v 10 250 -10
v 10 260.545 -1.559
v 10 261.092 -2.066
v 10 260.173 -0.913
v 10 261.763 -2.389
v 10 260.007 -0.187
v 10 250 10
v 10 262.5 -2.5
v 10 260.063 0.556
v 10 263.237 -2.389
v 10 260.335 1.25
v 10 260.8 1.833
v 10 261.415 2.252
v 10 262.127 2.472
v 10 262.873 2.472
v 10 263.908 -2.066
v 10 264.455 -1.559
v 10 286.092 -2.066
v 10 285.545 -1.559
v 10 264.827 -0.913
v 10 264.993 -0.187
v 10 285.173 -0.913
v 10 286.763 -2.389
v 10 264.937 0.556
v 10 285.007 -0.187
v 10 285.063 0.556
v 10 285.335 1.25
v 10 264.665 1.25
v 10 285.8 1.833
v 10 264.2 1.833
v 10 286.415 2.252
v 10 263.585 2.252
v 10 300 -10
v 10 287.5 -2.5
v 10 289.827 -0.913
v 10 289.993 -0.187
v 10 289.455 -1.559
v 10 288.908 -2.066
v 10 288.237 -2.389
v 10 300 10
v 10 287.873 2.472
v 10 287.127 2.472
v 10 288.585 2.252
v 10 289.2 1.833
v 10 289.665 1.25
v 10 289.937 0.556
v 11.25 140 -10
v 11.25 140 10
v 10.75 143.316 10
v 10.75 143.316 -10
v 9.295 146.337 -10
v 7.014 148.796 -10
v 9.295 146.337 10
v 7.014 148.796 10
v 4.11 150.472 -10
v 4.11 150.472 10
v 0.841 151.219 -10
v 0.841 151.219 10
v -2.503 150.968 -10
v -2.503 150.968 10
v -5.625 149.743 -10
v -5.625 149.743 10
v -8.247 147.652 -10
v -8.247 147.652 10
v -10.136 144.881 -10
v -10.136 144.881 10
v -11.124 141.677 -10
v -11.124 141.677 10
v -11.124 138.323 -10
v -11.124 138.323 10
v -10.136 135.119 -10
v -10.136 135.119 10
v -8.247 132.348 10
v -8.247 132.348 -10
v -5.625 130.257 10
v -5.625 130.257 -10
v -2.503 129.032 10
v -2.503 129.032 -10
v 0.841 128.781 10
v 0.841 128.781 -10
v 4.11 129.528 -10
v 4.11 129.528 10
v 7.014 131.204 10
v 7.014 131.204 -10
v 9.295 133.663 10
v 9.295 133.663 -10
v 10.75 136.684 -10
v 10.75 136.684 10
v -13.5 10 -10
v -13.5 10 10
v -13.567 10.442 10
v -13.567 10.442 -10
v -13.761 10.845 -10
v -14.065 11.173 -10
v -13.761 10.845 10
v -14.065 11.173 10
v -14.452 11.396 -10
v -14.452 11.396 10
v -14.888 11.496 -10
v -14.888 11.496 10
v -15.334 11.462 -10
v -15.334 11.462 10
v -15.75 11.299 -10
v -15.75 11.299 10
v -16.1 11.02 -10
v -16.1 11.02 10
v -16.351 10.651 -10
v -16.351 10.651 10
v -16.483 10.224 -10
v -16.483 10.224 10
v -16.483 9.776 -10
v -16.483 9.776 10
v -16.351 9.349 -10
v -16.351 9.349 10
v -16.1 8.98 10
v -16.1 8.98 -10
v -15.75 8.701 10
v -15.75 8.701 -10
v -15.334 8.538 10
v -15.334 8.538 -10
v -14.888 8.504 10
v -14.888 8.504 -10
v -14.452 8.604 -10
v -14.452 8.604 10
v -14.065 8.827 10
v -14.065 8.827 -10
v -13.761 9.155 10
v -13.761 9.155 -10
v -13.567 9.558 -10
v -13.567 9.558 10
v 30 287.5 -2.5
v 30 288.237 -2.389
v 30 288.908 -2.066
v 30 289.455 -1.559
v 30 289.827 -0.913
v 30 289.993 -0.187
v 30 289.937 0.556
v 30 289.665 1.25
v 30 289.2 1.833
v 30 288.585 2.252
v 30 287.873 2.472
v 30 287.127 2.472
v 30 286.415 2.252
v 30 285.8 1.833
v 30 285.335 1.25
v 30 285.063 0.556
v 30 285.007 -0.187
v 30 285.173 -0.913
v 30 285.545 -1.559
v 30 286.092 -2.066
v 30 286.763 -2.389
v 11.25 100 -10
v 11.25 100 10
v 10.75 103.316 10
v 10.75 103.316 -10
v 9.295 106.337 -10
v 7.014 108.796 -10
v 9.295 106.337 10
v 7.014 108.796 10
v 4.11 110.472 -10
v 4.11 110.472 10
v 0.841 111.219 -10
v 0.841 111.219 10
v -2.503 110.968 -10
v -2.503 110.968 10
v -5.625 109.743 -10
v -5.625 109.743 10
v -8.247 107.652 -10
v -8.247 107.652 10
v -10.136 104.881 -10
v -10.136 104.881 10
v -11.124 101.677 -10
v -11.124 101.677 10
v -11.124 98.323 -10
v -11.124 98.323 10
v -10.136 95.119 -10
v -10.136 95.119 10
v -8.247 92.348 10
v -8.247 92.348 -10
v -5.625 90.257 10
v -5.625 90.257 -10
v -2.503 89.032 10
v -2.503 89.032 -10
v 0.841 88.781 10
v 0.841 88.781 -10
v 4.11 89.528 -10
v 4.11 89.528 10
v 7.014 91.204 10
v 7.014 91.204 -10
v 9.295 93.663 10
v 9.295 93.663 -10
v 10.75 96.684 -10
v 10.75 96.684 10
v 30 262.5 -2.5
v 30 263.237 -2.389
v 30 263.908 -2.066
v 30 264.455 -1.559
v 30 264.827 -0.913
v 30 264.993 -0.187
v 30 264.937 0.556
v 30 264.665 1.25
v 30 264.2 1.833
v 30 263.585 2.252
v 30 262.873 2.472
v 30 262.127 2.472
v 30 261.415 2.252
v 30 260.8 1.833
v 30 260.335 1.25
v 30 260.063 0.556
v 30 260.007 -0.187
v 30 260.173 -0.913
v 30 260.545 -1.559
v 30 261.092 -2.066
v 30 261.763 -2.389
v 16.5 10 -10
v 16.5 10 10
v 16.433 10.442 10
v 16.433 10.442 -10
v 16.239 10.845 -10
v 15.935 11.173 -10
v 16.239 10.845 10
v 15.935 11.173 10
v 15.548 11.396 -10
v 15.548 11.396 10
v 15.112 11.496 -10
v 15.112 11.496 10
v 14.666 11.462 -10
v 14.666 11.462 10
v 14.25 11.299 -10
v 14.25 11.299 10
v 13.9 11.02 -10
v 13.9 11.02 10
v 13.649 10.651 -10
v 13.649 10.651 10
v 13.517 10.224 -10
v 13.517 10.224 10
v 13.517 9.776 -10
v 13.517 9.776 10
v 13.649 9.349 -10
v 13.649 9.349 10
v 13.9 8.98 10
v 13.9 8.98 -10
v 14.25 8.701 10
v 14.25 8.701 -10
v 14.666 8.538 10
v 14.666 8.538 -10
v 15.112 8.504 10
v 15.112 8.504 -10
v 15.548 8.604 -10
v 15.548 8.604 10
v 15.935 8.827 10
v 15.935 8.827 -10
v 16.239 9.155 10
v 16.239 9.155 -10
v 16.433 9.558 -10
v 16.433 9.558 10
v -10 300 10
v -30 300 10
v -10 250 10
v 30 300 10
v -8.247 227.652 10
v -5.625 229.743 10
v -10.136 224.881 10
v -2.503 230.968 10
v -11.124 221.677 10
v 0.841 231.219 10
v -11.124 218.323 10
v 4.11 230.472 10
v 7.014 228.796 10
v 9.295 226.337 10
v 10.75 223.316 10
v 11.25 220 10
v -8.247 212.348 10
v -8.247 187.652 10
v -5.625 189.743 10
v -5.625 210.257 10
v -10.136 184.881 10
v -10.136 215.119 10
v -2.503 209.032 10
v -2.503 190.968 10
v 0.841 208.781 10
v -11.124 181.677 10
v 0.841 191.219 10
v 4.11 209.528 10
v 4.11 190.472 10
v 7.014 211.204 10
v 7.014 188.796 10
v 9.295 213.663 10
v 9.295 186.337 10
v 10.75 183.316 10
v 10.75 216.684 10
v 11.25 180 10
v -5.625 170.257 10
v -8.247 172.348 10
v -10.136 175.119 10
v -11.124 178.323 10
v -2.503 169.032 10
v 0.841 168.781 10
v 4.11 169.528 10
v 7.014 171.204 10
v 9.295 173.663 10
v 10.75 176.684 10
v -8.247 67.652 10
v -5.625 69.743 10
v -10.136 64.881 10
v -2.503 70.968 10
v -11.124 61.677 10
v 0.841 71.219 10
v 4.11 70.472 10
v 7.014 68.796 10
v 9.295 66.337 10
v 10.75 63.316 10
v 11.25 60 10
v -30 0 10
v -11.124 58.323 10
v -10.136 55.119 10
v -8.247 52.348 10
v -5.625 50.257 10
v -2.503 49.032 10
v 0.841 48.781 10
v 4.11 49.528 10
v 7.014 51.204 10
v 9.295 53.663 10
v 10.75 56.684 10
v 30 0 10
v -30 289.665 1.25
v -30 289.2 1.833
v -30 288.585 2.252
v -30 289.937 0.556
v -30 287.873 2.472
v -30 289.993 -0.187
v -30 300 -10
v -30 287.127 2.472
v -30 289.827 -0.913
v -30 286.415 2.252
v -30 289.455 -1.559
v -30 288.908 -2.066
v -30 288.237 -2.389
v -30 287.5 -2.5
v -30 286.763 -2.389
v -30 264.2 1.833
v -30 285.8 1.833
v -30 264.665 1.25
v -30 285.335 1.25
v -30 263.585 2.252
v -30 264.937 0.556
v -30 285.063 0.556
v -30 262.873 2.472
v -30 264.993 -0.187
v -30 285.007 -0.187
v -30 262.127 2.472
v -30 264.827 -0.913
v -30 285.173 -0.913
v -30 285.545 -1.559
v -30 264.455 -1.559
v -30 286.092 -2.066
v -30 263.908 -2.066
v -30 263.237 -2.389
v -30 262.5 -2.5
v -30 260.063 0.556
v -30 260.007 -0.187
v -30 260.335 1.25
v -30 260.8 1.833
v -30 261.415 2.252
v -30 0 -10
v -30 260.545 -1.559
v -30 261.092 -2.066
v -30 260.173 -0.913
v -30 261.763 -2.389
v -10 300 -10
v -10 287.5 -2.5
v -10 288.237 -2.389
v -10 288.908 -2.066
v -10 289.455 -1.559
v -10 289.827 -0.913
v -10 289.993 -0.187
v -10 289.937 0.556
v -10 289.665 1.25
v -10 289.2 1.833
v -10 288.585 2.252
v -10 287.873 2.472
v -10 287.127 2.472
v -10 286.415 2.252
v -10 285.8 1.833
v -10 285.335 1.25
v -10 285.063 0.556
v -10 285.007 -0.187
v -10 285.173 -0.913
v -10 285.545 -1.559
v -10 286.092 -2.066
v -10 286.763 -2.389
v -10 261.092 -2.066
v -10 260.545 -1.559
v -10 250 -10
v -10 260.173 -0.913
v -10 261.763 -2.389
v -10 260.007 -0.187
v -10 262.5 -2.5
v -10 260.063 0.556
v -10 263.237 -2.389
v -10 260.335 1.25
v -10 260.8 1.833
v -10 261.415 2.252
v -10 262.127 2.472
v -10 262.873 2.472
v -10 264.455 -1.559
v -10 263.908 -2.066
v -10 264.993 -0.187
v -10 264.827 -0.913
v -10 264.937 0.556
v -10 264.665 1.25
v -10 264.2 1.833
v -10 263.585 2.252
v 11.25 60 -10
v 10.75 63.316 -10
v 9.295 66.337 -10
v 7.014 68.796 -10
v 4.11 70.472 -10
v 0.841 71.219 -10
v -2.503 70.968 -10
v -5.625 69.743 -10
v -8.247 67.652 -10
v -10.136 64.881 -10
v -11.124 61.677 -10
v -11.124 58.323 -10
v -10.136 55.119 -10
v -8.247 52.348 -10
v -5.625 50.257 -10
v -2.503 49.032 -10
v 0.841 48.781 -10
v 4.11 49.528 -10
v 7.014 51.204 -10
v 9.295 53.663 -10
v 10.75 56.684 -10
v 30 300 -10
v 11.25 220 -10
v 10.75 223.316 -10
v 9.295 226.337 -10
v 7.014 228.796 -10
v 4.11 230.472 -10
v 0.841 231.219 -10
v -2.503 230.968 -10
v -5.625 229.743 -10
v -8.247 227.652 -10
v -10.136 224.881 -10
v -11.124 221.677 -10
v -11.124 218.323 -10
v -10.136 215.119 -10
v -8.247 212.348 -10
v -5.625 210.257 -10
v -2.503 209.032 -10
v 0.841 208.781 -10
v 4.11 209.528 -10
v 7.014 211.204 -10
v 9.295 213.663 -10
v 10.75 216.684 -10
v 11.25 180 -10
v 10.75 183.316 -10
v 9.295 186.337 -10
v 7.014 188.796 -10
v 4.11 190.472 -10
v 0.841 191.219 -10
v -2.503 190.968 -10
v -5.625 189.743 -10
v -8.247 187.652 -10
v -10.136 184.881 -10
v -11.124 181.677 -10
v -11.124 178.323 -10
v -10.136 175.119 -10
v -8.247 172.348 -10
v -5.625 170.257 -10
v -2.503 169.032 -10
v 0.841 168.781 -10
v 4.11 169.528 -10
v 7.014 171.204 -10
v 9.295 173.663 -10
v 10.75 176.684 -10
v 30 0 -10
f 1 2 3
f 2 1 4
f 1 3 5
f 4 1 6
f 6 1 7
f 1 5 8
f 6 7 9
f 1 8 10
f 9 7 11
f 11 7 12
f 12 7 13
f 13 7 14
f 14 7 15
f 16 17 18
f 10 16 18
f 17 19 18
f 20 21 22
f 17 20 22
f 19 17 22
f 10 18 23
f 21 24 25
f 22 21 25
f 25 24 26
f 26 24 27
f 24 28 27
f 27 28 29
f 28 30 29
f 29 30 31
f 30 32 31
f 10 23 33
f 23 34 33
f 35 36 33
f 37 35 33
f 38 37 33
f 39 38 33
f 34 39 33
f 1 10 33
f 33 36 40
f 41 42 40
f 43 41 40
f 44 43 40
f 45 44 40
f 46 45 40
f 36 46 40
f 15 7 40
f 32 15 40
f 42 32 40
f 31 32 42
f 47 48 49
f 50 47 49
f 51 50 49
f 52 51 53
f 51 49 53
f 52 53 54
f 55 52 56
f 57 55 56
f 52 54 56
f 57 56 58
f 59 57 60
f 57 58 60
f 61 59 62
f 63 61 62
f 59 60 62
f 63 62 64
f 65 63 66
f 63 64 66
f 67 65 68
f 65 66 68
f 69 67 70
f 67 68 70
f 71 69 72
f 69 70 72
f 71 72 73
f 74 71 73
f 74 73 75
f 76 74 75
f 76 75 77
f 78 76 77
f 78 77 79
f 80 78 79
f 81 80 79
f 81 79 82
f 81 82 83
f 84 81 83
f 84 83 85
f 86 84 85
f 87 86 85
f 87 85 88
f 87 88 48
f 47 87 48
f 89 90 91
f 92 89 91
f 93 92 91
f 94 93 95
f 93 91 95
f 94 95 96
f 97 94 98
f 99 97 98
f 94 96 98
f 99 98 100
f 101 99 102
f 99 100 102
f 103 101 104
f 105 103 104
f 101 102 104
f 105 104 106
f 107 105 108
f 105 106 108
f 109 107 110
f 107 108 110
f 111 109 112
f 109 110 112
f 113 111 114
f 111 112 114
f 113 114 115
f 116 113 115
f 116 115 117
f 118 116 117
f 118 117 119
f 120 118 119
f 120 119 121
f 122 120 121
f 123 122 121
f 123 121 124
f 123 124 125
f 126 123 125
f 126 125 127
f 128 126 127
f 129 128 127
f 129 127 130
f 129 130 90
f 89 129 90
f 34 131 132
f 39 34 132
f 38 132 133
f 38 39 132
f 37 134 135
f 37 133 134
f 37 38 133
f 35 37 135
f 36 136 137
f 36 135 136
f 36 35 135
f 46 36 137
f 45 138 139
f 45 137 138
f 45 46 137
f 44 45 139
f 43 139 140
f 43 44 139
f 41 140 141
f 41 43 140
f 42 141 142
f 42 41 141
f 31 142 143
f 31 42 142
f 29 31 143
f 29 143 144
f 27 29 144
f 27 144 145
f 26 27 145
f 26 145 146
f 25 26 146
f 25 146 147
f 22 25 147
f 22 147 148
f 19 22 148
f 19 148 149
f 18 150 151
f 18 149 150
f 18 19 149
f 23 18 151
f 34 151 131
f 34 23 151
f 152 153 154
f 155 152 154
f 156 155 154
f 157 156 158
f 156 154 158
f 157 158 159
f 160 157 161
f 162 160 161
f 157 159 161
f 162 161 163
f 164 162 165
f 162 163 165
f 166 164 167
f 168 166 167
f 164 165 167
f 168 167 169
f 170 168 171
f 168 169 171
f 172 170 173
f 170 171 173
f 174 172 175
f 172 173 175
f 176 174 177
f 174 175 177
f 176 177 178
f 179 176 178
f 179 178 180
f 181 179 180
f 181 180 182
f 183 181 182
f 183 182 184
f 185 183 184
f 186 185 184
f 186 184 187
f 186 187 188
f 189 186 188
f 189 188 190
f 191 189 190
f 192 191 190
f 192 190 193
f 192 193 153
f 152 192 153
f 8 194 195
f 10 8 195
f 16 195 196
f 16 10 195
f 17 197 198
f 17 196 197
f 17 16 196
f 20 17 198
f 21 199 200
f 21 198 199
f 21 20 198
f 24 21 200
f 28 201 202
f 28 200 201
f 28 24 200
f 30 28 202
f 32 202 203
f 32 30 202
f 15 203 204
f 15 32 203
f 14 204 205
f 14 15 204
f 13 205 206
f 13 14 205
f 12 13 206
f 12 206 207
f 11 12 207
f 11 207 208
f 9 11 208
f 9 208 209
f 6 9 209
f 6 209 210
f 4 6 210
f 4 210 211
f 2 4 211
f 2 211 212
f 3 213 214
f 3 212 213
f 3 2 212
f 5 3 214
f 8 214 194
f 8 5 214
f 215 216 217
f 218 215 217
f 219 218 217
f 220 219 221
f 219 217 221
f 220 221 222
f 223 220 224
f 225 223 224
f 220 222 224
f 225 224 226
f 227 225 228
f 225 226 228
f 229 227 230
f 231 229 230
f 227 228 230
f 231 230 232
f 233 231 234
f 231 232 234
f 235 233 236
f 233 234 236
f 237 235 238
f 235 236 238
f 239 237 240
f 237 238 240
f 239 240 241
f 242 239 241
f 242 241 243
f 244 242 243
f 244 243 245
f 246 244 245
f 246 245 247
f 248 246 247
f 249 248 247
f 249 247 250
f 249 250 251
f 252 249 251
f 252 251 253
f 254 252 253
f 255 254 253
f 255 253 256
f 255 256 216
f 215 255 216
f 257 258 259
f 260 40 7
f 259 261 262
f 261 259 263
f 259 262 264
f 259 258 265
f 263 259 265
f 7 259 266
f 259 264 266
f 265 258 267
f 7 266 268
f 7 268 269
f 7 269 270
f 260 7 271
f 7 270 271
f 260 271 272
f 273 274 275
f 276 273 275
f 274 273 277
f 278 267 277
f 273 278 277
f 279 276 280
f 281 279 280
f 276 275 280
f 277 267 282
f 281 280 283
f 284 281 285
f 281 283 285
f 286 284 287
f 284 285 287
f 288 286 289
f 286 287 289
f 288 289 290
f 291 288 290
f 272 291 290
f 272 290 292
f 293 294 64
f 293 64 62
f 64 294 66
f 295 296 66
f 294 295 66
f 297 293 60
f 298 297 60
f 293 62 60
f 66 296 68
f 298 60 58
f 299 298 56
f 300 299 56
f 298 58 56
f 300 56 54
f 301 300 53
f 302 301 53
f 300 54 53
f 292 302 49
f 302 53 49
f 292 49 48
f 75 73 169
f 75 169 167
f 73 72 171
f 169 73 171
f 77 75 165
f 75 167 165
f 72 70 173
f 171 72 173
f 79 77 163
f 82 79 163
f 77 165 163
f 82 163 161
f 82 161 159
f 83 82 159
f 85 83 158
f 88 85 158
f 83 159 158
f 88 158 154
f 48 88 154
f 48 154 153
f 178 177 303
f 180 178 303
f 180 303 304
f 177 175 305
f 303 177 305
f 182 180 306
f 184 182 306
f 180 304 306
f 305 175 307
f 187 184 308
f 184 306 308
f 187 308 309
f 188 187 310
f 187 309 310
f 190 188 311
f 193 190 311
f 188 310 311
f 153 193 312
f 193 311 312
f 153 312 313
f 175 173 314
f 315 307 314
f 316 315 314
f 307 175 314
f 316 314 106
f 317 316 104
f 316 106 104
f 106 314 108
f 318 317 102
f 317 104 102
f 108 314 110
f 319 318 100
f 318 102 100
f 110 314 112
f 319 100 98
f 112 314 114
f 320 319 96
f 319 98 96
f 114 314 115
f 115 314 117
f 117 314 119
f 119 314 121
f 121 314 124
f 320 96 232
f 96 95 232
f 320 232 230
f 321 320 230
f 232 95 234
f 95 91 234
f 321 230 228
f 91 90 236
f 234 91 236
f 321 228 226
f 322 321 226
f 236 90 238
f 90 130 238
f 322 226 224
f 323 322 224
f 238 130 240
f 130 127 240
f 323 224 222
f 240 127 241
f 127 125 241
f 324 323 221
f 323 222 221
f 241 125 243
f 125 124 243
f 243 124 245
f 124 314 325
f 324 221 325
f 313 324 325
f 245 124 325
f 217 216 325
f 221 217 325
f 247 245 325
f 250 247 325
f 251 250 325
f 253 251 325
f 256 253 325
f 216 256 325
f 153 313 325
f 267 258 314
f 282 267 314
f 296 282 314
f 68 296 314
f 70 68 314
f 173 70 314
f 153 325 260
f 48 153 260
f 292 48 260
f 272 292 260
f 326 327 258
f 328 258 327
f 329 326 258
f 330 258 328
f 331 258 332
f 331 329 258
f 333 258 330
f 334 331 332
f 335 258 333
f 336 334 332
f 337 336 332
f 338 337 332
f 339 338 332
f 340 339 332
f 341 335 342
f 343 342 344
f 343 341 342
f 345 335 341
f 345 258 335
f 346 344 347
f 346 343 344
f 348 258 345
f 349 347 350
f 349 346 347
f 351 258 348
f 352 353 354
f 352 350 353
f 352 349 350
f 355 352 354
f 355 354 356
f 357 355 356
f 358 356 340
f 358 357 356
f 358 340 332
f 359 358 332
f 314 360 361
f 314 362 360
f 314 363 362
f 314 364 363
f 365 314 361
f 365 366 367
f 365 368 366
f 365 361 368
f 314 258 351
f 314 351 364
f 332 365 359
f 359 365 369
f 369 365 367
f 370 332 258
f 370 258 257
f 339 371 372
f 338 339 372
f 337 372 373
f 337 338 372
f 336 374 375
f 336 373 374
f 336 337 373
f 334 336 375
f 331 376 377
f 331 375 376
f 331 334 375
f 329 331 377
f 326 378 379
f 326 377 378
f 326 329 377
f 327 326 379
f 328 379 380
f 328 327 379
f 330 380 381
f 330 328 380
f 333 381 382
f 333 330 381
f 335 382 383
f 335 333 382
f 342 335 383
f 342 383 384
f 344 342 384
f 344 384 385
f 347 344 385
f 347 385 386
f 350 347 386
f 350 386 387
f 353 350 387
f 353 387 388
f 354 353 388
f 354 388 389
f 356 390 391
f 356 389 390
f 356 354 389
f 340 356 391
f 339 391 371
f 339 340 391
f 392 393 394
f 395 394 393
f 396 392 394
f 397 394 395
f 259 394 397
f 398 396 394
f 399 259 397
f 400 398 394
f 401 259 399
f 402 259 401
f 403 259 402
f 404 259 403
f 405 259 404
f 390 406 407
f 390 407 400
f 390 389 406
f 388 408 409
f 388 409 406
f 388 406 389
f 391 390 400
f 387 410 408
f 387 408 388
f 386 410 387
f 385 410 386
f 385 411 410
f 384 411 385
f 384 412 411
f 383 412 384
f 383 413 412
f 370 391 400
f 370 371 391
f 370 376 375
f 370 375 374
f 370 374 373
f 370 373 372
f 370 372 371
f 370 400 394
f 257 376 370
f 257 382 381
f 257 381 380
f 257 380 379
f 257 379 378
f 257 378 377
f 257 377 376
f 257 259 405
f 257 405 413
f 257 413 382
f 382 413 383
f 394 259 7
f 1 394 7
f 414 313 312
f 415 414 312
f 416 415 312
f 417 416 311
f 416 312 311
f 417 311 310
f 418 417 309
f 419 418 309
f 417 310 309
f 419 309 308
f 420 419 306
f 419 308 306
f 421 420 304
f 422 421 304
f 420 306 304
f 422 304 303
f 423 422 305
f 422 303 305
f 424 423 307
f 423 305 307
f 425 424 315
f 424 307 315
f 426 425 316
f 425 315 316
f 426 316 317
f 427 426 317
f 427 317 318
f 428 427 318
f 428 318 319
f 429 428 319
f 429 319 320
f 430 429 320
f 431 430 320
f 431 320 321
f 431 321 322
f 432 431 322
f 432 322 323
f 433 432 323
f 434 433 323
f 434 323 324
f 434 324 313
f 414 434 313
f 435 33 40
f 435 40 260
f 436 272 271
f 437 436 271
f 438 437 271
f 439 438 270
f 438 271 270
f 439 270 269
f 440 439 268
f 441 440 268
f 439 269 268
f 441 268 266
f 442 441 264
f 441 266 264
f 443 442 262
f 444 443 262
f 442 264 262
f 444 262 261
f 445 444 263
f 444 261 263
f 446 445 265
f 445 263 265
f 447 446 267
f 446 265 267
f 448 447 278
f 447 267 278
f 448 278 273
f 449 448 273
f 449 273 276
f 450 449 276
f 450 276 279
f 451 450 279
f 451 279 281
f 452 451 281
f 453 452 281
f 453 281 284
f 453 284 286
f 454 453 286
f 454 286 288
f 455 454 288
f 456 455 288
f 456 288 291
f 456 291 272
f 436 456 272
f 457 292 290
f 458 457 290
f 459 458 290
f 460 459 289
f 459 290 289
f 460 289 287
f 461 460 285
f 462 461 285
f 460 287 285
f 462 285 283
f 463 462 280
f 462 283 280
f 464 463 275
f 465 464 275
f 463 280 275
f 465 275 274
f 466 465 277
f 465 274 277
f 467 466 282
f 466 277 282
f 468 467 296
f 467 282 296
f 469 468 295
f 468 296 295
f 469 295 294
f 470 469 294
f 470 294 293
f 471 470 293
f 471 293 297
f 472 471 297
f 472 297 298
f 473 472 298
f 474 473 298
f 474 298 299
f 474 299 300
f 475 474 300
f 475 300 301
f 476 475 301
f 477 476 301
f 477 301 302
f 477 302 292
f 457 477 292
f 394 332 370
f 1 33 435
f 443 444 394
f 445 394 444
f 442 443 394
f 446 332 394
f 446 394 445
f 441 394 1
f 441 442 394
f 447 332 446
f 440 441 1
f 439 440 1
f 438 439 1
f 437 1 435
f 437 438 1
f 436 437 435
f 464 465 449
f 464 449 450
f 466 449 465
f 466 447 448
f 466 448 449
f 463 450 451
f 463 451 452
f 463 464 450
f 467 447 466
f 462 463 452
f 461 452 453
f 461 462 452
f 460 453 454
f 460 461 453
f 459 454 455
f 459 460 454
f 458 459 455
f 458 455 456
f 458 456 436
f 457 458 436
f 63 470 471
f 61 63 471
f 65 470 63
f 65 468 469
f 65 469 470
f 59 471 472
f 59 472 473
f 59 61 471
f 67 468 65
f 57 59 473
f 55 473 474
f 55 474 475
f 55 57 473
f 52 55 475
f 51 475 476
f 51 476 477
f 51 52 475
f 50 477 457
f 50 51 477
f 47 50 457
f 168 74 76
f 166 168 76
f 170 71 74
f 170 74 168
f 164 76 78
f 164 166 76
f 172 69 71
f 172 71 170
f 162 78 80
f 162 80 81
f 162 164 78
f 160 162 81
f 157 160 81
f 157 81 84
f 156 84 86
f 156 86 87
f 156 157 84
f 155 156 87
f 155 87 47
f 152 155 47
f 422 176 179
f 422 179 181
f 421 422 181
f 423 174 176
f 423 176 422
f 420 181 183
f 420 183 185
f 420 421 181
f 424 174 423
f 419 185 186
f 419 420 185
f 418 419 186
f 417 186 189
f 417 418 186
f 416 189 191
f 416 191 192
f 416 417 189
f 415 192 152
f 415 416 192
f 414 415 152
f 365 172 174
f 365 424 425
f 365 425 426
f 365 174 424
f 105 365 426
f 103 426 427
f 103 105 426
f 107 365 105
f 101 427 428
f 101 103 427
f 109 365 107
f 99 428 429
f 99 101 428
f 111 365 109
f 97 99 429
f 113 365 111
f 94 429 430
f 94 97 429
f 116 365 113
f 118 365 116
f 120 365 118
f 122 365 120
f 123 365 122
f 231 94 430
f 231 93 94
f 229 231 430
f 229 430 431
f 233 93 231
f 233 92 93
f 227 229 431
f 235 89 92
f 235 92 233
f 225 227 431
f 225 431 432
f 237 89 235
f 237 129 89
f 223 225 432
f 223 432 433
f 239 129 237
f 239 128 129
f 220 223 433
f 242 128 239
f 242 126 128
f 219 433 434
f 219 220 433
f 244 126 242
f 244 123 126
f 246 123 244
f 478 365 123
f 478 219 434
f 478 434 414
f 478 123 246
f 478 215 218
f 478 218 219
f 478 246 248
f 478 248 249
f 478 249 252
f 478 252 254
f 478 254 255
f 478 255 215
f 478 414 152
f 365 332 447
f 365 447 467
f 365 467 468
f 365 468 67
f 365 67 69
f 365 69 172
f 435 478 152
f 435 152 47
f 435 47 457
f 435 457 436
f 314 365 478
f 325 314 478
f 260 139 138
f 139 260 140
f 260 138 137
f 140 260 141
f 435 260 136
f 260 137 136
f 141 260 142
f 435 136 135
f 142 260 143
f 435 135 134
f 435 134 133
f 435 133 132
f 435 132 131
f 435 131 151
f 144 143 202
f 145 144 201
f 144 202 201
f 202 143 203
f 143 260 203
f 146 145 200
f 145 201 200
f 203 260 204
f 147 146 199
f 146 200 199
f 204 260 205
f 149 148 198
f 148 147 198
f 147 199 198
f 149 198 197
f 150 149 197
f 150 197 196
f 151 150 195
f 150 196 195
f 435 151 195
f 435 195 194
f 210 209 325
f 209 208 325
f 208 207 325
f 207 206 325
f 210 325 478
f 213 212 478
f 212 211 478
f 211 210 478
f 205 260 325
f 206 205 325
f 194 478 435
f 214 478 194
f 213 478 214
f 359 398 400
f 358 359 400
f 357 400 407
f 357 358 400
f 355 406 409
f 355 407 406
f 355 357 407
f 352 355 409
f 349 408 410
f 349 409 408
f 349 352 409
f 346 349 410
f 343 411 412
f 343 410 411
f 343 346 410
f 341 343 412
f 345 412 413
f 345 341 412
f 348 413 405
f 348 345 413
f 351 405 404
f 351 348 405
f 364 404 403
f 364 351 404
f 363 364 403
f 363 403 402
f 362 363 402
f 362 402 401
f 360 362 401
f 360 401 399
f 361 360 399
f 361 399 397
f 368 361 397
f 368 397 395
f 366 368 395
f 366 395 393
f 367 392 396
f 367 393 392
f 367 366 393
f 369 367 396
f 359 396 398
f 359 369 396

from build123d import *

# Parameters (mm, degrees)
SKIZZE1_W                            = 60
SKIZZE1_H                            = 20
AUFSATZ_LINEAR_AUSTRAGEN1_DEPTH      = 300
SKIZZE2_W                            = 20
SKIZZE2_H                            = 50
SCHNITT_LINEAR_AUSTRAGEN1_DEPTH      = 303.158898595
SKIZZE3_R                            = 11.25
SCHNITT_LINEAR_AUSTRAGEN2_DEPTH      = 300
SKIZZE7_R                            = 1.5
SCHNITT_LINEAR_AUSTRAGEN6_DEPTH      = 303.158898595
SCHNITT_LINEAR_AUSTRAGEN8_DEPTH      = 303.820078595
SCHNITT_LINEAR_AUSTRAGEN8_DEPTH_BACK = 303.820078595
SKIZZE10_R                           = 2.5


with BuildPart() as part:
    # Skizze1 → Aufsatz-Linear austragen1 (new body)
    with BuildSketch(Plane(origin=(0, 0, 0), x_dir=(1, 0, 0), z_dir=(0, 1, 0))):
        Rectangle(SKIZZE1_W, SKIZZE1_H)
    extrude(amount=AUFSATZ_LINEAR_AUSTRAGEN1_DEPTH)

    # Skizze2 → Schnitt-Linear austragen1 (cut, through all)
    with BuildSketch(Plane.XY.offset(10)):
        with Locations((0, 275)):
            Rectangle(SKIZZE2_W, SKIZZE2_H)
    extrude(amount=-SCHNITT_LINEAR_AUSTRAGEN1_DEPTH, mode=Mode.SUBTRACT)

    # Skizze3 → Schnitt-Linear austragen2 (cut)
    with BuildSketch(Plane.XY.offset(10)):
        with Locations((0, 220)):
            Circle(SKIZZE3_R)
        with Locations((0, 180)):
            Circle(SKIZZE3_R)
        with Locations((0, 140)):
            Circle(SKIZZE3_R)
        with Locations((0, 100)):
            Circle(SKIZZE3_R)
        with Locations((0, 60)):
            Circle(SKIZZE3_R)
    extrude(amount=-SCHNITT_LINEAR_AUSTRAGEN2_DEPTH, mode=Mode.SUBTRACT)

    # Skizze7 → Schnitt-Linear austragen6 (cut, through all)
    with BuildSketch(Plane.XY.offset(10)):
        with Locations((-15, 10)):
            Circle(SKIZZE7_R)
        with Locations((15, 10)):
            Circle(SKIZZE7_R)
    extrude(amount=-SCHNITT_LINEAR_AUSTRAGEN6_DEPTH, mode=Mode.SUBTRACT)

    # Skizze10 → Schnitt-Linear austragen8 (cut, two sides: drawn at the far end of the back side and taken through both)
    with BuildSketch(Plane(origin=(-10, 0, 0), x_dir=(0, 0, -1), z_dir=(1, 0, 0)).offset(-SCHNITT_LINEAR_AUSTRAGEN8_DEPTH_BACK)):
        with Locations((0, 262.5)):
            Circle(SKIZZE10_R)
        with Locations((0, 287.5)):
            Circle(SKIZZE10_R)
    extrude(amount=SCHNITT_LINEAR_AUSTRAGEN8_DEPTH + SCHNITT_LINEAR_AUSTRAGEN8_DEPTH_BACK, mode=Mode.SUBTRACT)


solid = part.part
